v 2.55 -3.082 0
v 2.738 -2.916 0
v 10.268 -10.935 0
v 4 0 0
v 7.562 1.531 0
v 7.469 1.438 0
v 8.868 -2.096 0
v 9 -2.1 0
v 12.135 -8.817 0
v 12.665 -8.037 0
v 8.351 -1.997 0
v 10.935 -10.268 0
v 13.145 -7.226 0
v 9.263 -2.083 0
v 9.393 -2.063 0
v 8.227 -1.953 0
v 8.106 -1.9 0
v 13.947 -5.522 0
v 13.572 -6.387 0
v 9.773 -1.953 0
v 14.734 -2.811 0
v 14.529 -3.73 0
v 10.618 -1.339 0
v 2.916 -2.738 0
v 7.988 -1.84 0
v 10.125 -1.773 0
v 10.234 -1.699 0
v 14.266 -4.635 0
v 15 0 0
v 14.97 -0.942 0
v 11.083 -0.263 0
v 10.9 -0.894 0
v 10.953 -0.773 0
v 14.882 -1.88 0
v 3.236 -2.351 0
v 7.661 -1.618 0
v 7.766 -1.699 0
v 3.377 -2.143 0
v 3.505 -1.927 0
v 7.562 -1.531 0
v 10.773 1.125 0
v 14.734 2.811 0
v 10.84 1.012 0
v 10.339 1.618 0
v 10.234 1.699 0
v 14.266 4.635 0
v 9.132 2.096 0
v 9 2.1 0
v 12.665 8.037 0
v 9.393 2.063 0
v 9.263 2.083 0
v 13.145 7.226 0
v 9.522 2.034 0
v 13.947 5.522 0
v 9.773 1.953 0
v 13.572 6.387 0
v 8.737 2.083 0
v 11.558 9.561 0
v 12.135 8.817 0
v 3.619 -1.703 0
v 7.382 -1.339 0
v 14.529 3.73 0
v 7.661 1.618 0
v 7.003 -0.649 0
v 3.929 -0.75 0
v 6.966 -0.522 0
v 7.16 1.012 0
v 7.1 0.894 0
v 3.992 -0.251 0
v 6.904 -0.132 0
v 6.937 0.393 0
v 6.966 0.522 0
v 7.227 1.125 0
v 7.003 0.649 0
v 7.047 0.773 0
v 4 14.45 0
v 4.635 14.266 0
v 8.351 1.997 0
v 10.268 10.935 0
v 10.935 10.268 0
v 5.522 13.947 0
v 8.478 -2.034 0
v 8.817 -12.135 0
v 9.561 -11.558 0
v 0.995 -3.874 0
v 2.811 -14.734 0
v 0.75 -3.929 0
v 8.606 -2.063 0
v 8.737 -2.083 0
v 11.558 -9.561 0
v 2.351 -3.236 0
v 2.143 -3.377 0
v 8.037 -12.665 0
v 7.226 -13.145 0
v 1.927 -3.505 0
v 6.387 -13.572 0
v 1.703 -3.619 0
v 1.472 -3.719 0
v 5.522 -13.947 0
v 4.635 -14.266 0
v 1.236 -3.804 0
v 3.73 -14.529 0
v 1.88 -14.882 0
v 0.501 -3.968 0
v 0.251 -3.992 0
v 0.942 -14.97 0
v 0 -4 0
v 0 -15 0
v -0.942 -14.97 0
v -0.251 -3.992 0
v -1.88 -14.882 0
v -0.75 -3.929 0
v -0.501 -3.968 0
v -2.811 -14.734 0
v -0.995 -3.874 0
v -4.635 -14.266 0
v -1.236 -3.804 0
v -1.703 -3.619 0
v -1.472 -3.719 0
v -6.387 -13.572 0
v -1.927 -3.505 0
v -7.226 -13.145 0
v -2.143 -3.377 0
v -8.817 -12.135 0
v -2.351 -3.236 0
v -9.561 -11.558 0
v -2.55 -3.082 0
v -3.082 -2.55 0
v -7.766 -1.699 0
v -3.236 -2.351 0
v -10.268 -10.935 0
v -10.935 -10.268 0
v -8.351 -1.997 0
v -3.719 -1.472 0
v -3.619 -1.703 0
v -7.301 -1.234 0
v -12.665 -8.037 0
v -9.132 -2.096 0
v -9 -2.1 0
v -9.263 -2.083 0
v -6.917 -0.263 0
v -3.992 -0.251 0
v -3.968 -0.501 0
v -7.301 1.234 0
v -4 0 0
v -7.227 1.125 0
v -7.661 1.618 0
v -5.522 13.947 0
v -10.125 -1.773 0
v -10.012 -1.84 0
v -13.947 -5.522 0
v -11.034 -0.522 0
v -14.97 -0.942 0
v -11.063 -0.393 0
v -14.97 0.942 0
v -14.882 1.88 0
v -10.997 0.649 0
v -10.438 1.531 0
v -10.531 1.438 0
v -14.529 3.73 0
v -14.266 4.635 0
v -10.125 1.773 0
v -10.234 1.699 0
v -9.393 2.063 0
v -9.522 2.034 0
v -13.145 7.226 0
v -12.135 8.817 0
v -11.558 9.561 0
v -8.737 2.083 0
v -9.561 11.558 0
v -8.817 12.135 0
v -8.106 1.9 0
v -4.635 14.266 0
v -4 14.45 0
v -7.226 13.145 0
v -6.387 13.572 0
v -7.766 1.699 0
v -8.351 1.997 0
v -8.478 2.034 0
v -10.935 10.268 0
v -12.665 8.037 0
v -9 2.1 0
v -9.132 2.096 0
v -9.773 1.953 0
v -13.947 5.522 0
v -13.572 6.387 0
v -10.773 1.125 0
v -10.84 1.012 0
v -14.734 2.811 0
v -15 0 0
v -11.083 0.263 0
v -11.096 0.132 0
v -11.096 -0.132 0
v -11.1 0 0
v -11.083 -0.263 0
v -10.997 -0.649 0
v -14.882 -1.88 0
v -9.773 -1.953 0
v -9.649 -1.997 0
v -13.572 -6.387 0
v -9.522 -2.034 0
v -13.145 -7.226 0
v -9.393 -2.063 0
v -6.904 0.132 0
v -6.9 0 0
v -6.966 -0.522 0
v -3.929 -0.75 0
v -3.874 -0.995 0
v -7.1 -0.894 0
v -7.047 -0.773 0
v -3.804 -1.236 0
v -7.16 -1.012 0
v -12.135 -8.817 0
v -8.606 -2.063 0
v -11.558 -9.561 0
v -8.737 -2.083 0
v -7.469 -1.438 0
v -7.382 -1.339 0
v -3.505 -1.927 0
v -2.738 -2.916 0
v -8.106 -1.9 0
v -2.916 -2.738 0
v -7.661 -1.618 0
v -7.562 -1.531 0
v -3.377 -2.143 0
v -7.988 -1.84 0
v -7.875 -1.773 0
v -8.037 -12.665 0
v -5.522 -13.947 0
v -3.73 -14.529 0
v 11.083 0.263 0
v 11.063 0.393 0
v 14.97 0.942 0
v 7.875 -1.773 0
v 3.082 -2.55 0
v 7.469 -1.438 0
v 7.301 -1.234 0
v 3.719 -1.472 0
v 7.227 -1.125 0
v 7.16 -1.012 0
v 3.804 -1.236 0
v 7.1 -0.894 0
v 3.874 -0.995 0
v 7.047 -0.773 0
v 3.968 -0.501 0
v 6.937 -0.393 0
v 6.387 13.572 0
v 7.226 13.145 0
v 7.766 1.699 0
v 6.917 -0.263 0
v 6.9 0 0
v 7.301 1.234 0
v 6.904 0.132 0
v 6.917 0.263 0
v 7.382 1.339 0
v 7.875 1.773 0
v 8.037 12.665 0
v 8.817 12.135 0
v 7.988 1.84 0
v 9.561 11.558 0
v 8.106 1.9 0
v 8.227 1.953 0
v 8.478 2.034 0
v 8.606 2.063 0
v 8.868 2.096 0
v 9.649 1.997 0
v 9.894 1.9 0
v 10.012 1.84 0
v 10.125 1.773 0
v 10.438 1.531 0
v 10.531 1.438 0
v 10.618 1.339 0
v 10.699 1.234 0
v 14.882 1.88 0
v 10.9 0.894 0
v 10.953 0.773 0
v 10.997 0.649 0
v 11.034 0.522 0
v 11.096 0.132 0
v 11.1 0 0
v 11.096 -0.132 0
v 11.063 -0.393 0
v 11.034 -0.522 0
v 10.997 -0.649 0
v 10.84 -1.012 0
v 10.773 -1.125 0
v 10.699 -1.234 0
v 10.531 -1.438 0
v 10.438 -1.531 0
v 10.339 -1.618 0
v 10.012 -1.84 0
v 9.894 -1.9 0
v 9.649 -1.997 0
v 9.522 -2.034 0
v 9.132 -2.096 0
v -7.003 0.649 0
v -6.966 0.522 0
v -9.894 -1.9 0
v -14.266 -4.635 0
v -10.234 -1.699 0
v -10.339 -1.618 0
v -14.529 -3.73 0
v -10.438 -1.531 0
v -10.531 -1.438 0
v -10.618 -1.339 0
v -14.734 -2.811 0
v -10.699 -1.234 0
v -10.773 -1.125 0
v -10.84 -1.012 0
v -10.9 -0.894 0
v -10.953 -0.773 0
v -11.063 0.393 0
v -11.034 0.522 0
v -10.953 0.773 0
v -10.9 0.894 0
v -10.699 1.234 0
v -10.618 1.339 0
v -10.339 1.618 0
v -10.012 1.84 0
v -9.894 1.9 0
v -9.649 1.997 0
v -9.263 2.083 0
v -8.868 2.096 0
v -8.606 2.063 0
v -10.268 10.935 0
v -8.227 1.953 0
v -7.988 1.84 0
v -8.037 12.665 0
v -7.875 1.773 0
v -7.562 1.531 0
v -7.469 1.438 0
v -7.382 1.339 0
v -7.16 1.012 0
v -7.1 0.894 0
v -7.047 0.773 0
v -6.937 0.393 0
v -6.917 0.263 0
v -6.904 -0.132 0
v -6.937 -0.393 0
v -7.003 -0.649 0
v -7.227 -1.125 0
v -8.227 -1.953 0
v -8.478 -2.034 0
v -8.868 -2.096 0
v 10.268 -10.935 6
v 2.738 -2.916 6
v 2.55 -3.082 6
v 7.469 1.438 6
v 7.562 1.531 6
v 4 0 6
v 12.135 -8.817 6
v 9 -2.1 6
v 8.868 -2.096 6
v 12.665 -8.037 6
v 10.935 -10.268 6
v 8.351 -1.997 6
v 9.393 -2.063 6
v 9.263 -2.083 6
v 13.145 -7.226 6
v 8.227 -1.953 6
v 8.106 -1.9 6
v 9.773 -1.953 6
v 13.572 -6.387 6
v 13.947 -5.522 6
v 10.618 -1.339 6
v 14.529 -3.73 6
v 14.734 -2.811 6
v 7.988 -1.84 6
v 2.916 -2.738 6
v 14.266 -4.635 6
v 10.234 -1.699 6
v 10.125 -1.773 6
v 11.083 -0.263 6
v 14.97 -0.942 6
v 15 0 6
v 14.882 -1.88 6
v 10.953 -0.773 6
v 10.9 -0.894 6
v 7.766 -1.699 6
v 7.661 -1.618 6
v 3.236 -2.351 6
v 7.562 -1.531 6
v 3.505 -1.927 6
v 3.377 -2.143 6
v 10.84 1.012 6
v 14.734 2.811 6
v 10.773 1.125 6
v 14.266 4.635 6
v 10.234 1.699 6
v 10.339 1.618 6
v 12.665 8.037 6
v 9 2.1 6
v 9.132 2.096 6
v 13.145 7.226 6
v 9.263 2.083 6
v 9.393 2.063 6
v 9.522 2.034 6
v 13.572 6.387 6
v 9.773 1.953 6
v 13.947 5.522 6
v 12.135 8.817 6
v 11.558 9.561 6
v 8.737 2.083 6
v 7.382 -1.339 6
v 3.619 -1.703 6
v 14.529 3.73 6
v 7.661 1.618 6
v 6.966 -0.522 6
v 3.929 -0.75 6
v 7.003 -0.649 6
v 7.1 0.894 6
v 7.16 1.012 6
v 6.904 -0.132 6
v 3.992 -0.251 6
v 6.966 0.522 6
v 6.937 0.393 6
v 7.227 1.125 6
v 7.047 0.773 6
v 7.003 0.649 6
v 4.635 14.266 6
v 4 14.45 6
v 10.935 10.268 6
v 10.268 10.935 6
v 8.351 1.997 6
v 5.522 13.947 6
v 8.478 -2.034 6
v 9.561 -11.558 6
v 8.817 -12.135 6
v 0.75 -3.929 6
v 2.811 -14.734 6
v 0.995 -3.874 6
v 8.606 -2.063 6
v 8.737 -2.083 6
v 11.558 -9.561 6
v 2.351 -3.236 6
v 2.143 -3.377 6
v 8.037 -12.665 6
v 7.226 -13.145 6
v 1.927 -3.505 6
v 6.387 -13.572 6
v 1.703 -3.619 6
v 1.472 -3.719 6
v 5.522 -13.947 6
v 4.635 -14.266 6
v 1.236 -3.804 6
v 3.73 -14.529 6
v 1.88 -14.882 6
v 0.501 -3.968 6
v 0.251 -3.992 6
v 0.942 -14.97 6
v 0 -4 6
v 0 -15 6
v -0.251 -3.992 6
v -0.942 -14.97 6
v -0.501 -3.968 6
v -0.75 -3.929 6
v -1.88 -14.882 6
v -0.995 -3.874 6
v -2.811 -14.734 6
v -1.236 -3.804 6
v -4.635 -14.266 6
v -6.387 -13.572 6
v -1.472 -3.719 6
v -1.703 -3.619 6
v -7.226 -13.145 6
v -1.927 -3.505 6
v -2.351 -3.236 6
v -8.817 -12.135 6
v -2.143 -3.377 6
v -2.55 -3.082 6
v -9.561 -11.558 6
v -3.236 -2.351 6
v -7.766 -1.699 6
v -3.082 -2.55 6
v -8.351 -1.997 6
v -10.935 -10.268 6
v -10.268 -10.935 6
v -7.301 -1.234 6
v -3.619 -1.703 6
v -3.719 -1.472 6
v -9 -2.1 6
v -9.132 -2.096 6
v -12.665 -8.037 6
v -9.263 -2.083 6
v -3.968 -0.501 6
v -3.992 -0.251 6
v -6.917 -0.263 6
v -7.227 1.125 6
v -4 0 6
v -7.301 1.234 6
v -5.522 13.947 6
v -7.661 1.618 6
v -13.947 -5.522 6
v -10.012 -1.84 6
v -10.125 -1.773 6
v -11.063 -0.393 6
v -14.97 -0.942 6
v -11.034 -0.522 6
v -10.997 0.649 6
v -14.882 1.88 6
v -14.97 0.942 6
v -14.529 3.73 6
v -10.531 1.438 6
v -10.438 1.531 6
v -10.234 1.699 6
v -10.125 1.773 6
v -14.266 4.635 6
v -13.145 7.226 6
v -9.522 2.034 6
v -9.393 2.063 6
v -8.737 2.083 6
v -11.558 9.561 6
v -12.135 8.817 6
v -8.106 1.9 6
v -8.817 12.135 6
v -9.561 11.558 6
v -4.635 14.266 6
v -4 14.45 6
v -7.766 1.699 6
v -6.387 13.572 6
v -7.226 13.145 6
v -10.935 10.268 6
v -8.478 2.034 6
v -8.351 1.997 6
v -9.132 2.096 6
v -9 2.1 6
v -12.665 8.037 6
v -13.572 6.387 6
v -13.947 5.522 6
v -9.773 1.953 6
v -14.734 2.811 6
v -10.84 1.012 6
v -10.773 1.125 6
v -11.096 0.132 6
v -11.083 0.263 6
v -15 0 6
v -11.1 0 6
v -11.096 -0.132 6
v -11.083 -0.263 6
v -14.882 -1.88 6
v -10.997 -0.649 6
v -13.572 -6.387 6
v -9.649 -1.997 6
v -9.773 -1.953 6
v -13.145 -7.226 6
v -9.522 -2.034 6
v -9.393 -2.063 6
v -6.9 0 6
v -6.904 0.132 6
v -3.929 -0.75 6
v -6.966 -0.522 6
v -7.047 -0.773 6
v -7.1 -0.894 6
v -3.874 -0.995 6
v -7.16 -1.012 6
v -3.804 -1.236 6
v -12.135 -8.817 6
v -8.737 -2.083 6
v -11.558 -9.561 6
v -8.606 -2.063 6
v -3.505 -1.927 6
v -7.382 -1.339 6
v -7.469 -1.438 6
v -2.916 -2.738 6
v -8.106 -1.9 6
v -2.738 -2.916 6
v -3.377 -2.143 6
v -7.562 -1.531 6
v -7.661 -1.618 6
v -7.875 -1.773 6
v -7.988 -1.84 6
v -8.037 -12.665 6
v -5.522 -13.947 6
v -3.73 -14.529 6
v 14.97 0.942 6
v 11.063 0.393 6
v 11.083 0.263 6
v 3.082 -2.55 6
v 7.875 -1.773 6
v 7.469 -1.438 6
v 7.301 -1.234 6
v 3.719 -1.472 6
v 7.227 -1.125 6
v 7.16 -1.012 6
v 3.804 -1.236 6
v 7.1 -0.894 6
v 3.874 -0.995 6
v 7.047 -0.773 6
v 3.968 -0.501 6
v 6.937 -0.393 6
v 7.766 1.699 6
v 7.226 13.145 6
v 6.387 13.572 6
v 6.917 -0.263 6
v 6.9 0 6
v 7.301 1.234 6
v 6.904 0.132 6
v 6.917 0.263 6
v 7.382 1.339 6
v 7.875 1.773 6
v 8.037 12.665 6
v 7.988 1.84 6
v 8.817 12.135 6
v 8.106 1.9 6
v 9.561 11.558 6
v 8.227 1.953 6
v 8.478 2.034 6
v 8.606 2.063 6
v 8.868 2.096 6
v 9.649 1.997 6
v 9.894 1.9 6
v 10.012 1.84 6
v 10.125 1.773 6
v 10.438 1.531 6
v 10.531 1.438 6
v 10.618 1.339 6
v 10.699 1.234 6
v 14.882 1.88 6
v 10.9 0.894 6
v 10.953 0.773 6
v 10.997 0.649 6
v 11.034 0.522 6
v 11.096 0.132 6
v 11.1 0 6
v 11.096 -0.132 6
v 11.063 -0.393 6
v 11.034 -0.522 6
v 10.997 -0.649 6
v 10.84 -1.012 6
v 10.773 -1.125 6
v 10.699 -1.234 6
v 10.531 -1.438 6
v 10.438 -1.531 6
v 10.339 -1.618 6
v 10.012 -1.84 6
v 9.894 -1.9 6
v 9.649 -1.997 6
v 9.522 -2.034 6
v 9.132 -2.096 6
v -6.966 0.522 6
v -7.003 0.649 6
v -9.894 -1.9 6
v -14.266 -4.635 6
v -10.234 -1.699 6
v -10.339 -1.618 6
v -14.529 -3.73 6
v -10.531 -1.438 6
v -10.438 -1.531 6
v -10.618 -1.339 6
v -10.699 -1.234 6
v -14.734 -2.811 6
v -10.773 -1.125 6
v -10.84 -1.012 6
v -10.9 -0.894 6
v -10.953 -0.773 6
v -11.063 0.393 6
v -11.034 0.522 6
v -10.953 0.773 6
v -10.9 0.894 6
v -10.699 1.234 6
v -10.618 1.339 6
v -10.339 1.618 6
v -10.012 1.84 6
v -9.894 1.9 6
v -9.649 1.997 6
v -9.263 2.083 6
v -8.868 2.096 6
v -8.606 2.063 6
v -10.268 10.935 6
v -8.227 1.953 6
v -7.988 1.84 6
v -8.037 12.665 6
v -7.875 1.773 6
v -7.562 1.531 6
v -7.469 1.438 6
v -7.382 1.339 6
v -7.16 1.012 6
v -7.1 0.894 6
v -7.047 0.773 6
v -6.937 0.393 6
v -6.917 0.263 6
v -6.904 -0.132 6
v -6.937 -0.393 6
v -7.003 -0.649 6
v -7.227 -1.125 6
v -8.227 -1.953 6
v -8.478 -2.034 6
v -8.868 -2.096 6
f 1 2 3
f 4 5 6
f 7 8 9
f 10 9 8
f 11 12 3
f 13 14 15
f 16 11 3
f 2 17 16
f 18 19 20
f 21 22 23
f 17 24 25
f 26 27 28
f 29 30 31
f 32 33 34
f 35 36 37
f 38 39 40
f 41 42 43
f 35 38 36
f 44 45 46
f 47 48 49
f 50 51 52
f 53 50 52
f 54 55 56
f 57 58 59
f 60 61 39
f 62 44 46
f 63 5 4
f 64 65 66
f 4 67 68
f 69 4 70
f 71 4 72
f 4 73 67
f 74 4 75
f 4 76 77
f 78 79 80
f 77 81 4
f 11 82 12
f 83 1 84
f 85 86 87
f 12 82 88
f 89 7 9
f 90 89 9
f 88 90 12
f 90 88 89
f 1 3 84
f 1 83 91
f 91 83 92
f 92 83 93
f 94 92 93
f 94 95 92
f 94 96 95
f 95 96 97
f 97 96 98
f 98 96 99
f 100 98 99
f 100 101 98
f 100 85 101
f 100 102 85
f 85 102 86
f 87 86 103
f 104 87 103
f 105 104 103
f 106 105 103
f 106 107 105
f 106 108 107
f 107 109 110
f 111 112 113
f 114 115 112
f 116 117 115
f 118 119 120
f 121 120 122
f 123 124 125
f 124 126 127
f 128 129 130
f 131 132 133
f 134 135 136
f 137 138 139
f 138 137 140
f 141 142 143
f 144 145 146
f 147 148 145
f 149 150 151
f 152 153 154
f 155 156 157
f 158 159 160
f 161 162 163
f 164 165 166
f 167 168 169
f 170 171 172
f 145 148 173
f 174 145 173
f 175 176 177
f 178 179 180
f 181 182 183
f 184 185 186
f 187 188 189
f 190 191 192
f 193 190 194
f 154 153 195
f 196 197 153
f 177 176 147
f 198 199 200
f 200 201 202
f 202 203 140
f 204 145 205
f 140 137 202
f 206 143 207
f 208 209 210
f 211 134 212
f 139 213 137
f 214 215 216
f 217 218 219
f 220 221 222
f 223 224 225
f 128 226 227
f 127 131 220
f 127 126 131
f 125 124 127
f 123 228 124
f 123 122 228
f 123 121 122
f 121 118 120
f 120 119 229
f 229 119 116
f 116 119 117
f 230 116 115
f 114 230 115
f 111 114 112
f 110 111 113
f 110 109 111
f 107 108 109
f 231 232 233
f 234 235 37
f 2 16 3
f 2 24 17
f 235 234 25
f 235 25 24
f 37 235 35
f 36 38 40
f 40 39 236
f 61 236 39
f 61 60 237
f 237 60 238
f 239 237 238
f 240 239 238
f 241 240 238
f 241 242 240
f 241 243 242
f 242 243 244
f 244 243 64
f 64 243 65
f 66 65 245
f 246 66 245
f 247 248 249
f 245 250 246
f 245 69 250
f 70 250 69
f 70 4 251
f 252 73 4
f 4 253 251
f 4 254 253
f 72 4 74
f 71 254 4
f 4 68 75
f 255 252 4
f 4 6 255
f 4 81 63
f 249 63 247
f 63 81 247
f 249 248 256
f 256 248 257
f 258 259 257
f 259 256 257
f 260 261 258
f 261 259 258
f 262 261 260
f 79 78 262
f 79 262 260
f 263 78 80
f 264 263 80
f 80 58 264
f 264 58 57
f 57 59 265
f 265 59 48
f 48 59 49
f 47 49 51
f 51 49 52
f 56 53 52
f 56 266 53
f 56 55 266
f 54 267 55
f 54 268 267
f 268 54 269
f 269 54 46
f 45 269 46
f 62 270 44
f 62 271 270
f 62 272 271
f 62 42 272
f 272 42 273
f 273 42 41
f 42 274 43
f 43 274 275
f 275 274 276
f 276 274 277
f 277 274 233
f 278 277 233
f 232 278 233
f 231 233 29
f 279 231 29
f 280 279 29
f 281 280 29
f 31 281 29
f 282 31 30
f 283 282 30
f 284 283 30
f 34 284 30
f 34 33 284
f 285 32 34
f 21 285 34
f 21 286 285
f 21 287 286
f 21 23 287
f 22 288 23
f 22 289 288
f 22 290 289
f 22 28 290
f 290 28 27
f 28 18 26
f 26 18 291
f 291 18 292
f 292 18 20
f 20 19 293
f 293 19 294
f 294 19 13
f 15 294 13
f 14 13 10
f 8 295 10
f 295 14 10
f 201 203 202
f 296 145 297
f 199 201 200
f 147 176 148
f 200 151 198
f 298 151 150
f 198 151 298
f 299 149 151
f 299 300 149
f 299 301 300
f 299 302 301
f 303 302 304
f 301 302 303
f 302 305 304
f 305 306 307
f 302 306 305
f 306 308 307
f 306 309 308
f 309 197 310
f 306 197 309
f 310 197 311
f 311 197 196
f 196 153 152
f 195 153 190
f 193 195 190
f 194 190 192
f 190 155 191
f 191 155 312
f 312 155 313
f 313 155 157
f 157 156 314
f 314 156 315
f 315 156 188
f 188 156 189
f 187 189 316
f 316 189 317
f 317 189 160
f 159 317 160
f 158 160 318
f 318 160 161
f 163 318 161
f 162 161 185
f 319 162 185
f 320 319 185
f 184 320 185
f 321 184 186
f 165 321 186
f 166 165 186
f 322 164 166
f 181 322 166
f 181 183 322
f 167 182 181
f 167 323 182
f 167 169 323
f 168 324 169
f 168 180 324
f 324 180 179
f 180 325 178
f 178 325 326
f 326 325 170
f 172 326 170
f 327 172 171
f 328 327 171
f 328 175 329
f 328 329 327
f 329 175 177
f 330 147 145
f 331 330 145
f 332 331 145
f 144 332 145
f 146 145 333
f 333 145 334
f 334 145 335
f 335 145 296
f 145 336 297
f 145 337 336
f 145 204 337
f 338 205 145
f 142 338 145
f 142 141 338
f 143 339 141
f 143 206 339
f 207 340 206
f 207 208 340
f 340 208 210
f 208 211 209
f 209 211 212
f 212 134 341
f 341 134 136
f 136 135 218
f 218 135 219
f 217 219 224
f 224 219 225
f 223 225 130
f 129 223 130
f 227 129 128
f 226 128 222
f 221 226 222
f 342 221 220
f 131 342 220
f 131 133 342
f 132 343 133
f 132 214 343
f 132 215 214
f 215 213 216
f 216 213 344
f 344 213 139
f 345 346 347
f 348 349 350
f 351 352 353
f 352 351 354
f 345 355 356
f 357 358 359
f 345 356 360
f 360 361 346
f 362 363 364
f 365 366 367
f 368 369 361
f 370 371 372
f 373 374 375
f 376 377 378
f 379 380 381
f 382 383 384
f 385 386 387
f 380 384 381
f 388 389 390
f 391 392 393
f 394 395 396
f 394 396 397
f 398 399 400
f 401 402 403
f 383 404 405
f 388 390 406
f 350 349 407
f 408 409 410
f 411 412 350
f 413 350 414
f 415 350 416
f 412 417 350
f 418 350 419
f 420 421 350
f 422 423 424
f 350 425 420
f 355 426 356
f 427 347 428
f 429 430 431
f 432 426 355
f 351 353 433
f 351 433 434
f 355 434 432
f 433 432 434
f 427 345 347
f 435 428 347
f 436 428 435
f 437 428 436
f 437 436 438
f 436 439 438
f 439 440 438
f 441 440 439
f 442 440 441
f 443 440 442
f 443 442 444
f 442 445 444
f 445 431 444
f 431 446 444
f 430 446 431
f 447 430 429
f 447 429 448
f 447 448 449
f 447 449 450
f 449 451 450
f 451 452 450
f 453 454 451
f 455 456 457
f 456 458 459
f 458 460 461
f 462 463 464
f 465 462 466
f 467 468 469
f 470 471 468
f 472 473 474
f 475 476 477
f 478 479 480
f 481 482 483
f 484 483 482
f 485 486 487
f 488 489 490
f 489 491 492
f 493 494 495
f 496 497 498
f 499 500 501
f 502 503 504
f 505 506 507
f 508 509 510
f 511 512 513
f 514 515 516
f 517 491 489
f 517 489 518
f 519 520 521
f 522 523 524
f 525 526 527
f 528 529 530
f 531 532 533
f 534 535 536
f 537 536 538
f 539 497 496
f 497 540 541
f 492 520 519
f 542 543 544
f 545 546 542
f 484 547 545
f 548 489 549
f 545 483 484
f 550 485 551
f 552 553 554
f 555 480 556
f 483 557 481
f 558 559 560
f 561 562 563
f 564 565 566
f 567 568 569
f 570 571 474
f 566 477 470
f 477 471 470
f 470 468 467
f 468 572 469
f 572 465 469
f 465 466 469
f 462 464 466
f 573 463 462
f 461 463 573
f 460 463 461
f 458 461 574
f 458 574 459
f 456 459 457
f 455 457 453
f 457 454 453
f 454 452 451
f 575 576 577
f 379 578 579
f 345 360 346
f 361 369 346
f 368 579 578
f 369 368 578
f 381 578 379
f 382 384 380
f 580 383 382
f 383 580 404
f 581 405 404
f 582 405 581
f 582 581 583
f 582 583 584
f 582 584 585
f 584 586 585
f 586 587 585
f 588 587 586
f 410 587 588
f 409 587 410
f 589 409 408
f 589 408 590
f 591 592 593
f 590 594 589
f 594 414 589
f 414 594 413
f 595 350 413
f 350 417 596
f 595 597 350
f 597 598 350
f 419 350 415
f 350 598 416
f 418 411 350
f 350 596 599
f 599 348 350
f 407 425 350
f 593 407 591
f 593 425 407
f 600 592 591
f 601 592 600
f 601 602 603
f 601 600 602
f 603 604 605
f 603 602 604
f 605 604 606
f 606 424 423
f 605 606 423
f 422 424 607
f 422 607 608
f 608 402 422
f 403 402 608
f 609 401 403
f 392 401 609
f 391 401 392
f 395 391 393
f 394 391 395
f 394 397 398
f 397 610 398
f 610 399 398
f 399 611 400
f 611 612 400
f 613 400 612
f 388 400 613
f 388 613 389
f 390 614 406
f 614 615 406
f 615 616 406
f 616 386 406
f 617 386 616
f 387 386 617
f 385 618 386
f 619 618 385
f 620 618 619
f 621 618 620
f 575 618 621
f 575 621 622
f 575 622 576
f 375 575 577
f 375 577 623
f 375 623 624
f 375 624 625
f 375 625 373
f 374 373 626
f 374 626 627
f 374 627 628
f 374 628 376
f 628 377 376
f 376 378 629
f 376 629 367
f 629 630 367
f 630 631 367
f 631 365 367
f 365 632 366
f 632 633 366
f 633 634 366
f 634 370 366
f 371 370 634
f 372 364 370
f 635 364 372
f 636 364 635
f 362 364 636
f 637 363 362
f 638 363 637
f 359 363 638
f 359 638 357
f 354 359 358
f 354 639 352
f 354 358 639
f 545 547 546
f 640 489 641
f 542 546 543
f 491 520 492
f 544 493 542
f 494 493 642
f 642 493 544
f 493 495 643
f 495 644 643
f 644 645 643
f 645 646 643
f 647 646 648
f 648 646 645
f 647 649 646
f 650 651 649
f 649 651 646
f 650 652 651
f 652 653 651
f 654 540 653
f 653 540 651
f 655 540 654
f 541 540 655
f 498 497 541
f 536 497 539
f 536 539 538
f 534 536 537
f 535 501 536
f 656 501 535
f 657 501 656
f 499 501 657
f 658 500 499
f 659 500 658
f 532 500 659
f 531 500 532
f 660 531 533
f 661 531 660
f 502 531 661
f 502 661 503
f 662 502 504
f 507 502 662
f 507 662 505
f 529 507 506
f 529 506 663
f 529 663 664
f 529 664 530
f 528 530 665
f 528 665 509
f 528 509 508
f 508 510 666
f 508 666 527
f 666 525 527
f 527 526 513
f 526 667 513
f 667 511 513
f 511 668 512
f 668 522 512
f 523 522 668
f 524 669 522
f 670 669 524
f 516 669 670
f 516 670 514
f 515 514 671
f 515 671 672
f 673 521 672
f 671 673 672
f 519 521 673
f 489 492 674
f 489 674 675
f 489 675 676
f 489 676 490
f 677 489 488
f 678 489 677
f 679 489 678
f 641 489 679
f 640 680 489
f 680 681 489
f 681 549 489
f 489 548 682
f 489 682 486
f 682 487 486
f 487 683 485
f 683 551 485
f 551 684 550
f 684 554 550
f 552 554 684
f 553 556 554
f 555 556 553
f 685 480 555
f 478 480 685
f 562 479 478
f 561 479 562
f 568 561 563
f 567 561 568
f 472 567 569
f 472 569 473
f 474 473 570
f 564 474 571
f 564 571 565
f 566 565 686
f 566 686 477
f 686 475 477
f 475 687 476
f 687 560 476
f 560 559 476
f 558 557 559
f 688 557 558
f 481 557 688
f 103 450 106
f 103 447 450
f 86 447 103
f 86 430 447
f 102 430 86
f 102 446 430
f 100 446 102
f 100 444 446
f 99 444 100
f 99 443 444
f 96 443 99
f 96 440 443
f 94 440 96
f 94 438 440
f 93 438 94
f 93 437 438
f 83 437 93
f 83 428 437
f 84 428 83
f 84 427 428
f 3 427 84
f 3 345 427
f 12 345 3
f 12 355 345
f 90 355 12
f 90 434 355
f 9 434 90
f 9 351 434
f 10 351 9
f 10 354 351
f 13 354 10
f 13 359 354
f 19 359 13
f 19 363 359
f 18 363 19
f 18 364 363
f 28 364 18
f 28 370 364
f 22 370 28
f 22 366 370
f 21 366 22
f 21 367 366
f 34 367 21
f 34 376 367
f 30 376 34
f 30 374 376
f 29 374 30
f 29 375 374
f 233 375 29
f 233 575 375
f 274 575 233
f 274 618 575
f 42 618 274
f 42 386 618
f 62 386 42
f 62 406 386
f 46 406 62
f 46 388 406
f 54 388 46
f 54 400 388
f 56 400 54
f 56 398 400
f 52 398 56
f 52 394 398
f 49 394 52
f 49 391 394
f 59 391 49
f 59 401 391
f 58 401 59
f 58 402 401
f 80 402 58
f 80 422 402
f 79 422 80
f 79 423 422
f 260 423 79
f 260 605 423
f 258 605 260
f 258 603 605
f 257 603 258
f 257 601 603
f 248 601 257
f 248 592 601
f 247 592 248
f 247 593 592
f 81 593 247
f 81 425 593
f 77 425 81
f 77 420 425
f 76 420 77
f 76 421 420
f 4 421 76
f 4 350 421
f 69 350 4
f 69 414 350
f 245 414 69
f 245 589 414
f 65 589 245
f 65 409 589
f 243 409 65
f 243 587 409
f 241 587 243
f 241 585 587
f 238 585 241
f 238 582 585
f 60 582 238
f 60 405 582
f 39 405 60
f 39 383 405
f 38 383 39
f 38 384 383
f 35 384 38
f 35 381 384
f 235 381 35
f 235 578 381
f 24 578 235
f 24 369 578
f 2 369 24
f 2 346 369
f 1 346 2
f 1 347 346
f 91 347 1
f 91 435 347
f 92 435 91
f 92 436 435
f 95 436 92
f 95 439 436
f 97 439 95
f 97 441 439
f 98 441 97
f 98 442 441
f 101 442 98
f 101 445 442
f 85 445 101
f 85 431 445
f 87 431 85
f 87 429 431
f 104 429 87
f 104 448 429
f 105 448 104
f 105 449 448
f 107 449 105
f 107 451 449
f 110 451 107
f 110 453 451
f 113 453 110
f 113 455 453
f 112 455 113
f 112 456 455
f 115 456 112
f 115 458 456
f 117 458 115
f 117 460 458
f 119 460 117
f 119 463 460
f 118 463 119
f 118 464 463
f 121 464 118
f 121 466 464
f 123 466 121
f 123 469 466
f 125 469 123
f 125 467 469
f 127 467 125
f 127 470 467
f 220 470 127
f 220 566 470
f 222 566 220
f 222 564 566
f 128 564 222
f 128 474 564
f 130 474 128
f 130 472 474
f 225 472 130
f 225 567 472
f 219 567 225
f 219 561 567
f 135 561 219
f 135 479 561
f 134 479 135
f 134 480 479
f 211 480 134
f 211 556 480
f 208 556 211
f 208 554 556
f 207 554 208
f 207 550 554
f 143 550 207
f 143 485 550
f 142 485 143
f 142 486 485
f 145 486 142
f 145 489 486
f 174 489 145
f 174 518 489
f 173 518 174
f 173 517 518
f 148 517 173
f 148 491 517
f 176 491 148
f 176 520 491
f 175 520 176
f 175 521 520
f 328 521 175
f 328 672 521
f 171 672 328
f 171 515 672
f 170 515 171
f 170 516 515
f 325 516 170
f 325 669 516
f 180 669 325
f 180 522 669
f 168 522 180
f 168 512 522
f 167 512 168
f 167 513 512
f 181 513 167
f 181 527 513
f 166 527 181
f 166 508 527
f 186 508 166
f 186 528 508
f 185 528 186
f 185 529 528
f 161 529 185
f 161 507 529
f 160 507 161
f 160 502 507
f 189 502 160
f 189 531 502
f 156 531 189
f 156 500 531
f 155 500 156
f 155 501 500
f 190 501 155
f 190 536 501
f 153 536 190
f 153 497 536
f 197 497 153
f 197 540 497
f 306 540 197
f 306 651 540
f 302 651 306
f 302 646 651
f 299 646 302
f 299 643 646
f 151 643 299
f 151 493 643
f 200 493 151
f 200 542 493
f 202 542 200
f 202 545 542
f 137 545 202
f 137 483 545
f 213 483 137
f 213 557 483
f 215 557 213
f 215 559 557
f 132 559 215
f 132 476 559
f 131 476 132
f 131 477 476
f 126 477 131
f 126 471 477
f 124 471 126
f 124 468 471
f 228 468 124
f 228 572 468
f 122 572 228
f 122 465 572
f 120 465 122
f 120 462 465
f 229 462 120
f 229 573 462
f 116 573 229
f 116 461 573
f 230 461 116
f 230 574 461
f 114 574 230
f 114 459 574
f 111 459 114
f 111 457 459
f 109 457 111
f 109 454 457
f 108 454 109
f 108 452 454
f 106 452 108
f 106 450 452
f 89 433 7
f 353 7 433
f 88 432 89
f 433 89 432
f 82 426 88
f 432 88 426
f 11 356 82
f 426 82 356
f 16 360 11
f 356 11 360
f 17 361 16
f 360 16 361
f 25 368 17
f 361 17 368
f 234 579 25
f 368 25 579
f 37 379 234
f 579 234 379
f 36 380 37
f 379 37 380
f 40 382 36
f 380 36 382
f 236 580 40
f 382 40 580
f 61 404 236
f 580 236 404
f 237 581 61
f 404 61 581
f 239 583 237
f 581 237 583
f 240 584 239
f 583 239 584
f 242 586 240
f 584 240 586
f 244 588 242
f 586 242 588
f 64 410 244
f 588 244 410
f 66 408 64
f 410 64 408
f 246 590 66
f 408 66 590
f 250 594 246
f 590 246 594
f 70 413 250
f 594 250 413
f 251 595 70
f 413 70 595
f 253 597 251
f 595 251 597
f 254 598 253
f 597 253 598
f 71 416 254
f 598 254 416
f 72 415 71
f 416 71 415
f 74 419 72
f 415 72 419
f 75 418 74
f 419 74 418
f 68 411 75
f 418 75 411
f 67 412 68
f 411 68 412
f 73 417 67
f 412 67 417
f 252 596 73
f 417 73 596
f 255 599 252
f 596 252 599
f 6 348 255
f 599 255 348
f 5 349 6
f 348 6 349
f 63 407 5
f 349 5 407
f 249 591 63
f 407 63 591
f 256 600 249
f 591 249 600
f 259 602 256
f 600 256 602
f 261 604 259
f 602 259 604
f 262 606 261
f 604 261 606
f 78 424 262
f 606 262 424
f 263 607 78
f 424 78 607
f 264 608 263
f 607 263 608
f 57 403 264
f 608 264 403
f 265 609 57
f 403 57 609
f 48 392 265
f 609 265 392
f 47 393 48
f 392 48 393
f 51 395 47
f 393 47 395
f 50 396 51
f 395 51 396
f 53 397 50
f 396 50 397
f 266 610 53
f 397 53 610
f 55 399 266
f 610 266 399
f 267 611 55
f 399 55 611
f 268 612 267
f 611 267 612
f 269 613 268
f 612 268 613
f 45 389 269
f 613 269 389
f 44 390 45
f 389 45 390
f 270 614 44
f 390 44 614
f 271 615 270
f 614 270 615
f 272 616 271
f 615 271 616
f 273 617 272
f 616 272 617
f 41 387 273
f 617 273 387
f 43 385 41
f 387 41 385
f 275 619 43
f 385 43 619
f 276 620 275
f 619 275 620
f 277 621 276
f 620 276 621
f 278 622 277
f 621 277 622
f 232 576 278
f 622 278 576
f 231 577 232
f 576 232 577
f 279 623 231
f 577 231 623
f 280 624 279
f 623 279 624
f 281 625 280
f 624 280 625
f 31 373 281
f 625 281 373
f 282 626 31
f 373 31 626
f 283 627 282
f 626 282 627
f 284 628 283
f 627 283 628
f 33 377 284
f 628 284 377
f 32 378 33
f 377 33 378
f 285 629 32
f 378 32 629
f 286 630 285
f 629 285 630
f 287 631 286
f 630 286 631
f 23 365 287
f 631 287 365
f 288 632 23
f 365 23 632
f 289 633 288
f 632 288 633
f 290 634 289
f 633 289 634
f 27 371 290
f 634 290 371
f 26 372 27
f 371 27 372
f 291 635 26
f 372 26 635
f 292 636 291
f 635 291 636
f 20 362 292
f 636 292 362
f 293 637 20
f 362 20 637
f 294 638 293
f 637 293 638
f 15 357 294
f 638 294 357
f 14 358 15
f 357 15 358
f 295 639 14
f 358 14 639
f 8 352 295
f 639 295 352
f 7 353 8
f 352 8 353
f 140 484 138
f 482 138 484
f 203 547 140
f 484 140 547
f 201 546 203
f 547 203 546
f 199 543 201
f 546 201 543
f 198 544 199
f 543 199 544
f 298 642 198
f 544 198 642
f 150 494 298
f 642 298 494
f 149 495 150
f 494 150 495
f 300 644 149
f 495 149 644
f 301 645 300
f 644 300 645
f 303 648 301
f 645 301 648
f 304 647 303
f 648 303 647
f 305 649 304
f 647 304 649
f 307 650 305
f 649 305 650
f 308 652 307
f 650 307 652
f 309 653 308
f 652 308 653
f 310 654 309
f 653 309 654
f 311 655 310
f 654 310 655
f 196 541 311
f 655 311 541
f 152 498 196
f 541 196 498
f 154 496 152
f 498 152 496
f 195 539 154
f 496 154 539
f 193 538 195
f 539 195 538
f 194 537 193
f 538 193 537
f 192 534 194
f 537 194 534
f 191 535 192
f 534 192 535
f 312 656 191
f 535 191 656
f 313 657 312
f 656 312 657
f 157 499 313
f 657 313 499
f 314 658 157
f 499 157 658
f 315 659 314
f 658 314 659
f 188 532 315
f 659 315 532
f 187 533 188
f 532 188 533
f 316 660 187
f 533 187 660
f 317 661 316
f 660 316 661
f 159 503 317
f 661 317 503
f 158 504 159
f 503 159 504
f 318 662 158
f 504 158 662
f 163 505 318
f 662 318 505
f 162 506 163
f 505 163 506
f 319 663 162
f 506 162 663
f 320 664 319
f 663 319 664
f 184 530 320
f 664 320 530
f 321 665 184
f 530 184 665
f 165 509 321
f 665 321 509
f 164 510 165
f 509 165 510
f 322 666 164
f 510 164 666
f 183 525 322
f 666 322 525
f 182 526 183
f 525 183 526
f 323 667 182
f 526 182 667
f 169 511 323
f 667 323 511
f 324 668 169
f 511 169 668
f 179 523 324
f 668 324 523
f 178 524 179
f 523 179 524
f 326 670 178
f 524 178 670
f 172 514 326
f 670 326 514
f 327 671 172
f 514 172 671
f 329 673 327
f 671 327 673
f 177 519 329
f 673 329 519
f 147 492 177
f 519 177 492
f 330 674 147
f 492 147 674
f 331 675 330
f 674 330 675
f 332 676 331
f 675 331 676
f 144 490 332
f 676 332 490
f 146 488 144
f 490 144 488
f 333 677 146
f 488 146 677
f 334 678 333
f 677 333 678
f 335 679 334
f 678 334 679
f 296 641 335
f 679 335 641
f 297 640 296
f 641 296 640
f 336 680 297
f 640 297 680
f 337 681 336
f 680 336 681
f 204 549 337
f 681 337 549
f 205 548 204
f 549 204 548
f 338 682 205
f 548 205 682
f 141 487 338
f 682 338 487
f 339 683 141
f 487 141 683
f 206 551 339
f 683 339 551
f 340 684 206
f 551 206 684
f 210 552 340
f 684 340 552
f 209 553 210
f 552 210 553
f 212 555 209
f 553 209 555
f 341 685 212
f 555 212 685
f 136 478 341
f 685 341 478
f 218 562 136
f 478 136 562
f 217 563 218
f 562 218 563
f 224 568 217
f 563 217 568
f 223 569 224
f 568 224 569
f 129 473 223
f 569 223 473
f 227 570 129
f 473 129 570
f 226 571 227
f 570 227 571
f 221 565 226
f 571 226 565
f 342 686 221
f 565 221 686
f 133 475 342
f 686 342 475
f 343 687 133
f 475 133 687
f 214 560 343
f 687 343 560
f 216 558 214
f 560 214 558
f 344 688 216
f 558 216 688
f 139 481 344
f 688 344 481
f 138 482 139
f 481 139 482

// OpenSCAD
$fn=100;
holder_thickness = 6;
holder_diameter = 30;
hole_diameter = 4.2;
rod_diameter = 8;

linear_extrude(height=holder_thickness) {
    difference() {
        circle(d = holder_diameter);

        # hull() {
            circle(d = rod_diameter);
            translate([0, holder_diameter/2, 0])
                circle(d = rod_diameter);
        }

        let(hole_position = holder_diameter * 0.3) {
            translate([hole_position, 0, 0])
                circle(d = hole_diameter);
            translate([- hole_position, 0, 0])
                circle(d = hole_diameter);
        }
    }
}
